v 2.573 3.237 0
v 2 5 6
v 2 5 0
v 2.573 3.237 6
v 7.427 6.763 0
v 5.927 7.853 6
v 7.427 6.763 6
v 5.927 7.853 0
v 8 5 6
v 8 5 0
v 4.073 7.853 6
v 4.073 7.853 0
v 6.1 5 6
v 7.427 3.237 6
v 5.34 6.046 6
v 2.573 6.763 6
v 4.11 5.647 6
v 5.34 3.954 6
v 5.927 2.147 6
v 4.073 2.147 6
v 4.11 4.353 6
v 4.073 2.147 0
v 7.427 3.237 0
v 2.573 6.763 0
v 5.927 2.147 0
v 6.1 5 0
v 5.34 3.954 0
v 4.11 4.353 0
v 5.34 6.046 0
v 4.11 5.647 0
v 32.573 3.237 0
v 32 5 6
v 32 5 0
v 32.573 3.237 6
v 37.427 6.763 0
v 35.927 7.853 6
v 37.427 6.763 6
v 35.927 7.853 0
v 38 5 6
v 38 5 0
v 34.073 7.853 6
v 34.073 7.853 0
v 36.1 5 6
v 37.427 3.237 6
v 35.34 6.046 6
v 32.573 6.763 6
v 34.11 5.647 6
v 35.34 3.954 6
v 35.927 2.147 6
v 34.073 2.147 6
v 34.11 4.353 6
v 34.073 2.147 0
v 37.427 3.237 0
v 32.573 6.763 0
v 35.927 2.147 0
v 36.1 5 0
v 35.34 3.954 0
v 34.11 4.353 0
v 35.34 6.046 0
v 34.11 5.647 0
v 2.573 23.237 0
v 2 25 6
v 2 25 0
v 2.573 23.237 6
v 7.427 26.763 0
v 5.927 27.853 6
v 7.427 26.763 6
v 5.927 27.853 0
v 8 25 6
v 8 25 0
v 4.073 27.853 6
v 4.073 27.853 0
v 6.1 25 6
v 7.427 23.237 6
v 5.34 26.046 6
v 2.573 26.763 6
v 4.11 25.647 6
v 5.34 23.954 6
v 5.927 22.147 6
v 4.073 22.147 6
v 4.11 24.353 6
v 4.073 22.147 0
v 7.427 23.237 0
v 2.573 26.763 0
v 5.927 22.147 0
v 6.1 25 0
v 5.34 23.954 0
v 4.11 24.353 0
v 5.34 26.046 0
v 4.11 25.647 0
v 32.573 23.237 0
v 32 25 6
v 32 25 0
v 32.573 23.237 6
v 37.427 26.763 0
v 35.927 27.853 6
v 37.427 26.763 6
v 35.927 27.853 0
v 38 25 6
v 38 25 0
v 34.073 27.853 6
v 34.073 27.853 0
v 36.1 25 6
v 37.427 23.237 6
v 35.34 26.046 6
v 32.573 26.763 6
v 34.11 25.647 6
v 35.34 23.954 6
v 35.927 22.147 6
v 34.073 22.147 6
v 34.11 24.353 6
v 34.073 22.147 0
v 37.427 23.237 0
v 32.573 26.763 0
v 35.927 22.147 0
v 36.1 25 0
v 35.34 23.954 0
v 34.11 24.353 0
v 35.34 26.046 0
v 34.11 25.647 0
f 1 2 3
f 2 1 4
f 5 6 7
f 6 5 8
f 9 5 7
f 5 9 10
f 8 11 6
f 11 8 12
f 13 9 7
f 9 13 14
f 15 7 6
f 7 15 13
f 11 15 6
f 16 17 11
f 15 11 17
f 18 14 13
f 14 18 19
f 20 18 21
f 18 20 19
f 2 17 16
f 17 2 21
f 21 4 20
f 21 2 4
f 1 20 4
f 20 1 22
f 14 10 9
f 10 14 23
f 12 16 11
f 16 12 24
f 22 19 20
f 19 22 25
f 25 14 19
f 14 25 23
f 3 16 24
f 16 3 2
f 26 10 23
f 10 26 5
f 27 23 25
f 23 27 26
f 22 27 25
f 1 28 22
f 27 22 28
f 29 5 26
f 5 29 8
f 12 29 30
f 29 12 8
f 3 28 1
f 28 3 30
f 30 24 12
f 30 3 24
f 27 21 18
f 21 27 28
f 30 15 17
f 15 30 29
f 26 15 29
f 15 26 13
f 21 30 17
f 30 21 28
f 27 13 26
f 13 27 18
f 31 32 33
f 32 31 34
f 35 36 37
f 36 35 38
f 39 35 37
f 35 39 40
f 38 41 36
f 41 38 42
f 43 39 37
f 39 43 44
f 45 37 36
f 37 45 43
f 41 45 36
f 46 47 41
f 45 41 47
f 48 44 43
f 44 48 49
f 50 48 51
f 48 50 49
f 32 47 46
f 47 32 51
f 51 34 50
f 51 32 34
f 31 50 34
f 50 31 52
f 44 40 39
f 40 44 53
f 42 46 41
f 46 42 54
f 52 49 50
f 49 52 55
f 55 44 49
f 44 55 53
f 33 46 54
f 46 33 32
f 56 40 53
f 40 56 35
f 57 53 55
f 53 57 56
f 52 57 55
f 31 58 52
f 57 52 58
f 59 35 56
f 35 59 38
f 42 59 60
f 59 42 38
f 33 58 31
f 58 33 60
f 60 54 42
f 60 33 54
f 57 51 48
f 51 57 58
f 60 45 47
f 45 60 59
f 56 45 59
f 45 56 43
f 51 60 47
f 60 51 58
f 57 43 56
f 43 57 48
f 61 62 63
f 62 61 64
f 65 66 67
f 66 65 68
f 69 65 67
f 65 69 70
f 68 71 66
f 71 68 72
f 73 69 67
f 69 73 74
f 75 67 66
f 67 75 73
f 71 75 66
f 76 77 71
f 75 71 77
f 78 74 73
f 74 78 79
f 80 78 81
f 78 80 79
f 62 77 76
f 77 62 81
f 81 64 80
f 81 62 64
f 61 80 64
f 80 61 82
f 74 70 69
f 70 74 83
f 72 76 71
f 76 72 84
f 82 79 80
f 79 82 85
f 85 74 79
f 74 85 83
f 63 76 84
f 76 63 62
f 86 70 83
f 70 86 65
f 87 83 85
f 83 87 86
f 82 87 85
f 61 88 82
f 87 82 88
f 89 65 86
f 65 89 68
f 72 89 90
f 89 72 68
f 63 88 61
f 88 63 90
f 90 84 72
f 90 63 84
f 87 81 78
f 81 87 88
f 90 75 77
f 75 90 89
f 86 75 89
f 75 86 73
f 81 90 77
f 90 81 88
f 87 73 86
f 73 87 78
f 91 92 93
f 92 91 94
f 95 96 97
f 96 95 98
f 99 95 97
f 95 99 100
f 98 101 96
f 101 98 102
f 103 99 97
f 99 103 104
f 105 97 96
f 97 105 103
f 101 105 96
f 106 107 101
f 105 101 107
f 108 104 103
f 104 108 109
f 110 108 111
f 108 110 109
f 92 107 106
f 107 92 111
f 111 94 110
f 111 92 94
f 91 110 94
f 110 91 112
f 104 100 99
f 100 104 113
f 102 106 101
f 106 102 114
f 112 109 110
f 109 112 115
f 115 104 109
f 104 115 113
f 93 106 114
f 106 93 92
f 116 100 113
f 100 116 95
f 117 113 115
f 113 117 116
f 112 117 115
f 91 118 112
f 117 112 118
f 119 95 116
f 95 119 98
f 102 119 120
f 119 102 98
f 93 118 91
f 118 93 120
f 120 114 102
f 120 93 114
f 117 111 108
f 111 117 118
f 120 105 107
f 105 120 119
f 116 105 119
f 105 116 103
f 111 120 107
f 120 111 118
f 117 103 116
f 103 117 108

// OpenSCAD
module busje(h=6, d=6, gat=2.2) {
  difference() {
    cylinder(h=h, d=d);
    translate([0,0,-1]) cylinder(h=h+2, d=gat);
  } }
for (p = [[5,5], [35,5], [5,25], [35,25]])
  translate([p[0], p[1], 0]) busje();
